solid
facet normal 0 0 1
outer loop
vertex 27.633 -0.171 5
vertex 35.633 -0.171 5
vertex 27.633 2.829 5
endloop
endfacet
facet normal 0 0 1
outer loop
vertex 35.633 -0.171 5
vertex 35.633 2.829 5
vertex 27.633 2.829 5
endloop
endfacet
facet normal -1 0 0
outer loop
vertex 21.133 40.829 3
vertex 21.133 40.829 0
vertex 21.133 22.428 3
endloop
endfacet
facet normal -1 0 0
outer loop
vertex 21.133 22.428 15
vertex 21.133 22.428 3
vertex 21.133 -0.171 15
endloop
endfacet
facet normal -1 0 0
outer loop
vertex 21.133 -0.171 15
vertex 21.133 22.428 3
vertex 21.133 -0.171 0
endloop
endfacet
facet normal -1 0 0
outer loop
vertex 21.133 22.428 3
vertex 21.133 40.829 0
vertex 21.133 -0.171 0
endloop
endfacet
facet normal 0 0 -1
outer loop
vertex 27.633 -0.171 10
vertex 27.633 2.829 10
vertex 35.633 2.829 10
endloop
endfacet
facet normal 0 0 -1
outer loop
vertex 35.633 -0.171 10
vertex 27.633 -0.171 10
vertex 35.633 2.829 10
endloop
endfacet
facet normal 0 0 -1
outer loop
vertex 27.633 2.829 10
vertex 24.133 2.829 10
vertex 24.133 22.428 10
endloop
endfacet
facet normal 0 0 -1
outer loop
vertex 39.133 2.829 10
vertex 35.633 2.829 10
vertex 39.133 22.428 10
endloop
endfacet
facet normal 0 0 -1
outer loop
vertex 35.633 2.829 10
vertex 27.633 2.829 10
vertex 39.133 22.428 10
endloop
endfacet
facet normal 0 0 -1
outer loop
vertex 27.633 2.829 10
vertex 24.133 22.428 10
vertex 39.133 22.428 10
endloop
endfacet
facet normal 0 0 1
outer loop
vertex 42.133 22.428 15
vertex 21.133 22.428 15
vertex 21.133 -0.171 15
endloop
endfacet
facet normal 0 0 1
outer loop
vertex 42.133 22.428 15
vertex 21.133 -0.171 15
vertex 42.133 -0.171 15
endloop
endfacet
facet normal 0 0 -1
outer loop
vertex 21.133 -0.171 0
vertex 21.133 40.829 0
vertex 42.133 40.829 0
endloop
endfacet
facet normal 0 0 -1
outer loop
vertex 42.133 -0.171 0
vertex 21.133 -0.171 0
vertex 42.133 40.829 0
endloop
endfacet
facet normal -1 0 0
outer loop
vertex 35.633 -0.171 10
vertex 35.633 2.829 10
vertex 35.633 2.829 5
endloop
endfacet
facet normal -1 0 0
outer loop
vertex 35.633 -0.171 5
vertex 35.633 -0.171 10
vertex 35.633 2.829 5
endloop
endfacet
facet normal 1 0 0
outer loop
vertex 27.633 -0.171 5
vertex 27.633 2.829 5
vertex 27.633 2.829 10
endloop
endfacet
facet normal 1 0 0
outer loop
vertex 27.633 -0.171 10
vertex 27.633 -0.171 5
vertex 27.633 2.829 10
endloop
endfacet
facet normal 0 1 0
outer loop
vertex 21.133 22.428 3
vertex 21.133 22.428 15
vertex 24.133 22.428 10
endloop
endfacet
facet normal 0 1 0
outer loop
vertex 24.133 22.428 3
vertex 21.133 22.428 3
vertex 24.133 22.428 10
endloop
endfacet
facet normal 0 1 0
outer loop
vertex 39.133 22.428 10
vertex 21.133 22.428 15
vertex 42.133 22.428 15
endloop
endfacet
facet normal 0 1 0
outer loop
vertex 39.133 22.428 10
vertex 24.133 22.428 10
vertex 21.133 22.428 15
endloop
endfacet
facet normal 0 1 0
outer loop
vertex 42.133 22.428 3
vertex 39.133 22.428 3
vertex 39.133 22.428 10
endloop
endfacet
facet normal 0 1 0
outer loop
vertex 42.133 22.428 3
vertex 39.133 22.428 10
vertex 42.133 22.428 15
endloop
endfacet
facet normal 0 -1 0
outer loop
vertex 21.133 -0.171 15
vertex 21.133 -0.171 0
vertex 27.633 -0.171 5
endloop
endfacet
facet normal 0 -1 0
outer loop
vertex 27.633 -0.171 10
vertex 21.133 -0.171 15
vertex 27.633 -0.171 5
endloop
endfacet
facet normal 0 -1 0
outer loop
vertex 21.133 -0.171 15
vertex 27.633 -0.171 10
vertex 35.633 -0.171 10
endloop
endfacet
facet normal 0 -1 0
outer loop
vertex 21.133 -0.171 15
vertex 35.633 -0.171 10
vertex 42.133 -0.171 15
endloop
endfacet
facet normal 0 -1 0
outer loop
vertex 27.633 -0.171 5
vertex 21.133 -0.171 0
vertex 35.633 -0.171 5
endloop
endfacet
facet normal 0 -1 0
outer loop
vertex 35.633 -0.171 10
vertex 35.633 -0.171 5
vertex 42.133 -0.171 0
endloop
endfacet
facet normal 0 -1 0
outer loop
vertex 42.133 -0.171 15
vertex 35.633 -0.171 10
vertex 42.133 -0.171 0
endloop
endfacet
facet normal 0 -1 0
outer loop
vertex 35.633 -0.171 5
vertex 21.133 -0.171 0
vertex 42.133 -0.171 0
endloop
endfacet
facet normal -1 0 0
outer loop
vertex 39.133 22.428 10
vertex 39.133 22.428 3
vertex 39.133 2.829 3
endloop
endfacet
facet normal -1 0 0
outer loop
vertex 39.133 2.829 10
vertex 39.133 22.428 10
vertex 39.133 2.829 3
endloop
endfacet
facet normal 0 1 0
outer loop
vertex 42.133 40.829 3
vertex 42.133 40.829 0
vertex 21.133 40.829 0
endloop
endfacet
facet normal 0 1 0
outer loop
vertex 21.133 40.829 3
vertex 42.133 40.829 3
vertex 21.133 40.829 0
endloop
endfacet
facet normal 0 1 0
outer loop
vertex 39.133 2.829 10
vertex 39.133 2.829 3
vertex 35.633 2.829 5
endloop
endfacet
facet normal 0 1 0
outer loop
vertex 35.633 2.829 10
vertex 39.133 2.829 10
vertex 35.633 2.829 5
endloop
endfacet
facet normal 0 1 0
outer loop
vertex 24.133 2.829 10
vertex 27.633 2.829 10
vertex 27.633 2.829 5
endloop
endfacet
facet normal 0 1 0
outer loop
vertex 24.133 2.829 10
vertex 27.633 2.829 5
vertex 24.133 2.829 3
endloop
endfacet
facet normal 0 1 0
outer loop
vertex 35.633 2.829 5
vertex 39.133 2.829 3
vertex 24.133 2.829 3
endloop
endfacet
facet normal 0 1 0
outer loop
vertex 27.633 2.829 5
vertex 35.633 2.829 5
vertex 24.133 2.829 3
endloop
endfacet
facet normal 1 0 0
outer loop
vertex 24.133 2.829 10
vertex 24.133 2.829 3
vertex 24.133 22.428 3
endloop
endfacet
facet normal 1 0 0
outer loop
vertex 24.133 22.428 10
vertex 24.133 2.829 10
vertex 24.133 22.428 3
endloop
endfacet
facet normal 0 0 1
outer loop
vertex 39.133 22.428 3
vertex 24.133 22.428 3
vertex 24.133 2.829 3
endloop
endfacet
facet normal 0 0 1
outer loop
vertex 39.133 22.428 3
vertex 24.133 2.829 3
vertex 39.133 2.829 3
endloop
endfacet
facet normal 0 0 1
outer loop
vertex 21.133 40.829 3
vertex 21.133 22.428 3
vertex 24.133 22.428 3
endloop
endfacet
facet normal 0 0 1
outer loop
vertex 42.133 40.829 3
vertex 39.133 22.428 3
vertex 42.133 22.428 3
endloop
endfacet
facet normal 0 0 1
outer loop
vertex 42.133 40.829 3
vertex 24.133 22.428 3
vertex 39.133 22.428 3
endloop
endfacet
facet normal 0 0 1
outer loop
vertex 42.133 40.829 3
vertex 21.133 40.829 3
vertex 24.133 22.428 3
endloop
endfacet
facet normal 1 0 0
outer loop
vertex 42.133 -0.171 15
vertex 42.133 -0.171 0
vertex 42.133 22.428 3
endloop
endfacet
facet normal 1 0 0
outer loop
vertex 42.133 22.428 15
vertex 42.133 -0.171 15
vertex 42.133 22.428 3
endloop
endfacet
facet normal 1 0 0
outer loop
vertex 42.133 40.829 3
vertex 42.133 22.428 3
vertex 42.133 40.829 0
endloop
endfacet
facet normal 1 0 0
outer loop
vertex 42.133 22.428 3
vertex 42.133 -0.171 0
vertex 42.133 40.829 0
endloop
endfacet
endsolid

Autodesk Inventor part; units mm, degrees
ref_plane "YZ Plane" through (0, 0, 0) normal (1, 0, 0) x (0, 1, 0)
ref_plane "XZ Plane" through (0, 0, 0) normal (0, 1, 0) x (-1, 0, 0)
ref_plane "XY Plane" through (0, 0, 0) normal (0, 0, 1) x (1, 0, 0)
sketch "Sketch1" plane through (0, 0, 0) normal (0, 0, 1) x (1, 0, 0)
  line L0 (24.1334, 37.8287) -> (39.1334, 37.8287)
  line L1 (39.1334, 37.8287) -> (39.1334, 2.8287)
  line L2 (39.1334, 2.8287) -> (24.1334, 2.8287)
  line L3 (24.1334, 2.8287) -> (24.1334, 37.8287)
  line L4 (42.1334, 40.8287) -> (21.1334, 40.8287)
  line L5 (21.1334, 40.8287) -> (21.1334, -0.1713)
  line L6 (21.1334, -0.1713) -> (42.1334, -0.1713)
  line L7 (42.1334, -0.1713) -> (42.1334, 40.8287)
  line L8 (21.1334, 22.4276) -> (42.1334, 22.4276)
  point P0 (0, 0)
  point P1 (24.1334, 22.4276)
  point P2 (39.1334, 22.4276)
  dimension "d0" = 15
  dimension "d1" = 35
  dimension "d2" = 3
extrude "Extrusion1" add sketch "Sketch1" along normal blind 3
extrude "Extrusion2" add sketch "Sketch1" along normal blind 15 contours L3 L2 L1 L8 L7 L6 L5
extrude "Extrusion3" add sketch "Sketch1" along normal blind 15 contours L8 L1 L2 L3
extrude "Extrusion4" cut sketch "Sketch1" along normal blind 10 contours L8 L1 L2 L3
extrude "Extrusion5" add sketch "Sketch1" along normal blind 3 contours L8 L1 L2 L3
sketch "Sketch2" plane through (24.1334, 2.8287, 3) normal (0, 1, 0) x (1, 0, 0)
  line L0 (0, -7) -> (15, -7) projected
  line L1 (3.5, -7) -> (11.5, -7)
  line L2 (11.5, -7) -> (11.5, -2)
  line L3 (11.5, -2) -> (3.5, -2)
  line L4 (3.5, -2) -> (3.5, -7)
  line L5 (0, -7) -> (0, 0) projected
  point P0 (-24.1334, 3)
  dimension "d13" = 8
  dimension "d14" = 5
  dimension "d15" = 3.5
extrude "Extrusion6" cut sketch "Sketch2" against normal blind 3
properties part number "IRsensorhub"
